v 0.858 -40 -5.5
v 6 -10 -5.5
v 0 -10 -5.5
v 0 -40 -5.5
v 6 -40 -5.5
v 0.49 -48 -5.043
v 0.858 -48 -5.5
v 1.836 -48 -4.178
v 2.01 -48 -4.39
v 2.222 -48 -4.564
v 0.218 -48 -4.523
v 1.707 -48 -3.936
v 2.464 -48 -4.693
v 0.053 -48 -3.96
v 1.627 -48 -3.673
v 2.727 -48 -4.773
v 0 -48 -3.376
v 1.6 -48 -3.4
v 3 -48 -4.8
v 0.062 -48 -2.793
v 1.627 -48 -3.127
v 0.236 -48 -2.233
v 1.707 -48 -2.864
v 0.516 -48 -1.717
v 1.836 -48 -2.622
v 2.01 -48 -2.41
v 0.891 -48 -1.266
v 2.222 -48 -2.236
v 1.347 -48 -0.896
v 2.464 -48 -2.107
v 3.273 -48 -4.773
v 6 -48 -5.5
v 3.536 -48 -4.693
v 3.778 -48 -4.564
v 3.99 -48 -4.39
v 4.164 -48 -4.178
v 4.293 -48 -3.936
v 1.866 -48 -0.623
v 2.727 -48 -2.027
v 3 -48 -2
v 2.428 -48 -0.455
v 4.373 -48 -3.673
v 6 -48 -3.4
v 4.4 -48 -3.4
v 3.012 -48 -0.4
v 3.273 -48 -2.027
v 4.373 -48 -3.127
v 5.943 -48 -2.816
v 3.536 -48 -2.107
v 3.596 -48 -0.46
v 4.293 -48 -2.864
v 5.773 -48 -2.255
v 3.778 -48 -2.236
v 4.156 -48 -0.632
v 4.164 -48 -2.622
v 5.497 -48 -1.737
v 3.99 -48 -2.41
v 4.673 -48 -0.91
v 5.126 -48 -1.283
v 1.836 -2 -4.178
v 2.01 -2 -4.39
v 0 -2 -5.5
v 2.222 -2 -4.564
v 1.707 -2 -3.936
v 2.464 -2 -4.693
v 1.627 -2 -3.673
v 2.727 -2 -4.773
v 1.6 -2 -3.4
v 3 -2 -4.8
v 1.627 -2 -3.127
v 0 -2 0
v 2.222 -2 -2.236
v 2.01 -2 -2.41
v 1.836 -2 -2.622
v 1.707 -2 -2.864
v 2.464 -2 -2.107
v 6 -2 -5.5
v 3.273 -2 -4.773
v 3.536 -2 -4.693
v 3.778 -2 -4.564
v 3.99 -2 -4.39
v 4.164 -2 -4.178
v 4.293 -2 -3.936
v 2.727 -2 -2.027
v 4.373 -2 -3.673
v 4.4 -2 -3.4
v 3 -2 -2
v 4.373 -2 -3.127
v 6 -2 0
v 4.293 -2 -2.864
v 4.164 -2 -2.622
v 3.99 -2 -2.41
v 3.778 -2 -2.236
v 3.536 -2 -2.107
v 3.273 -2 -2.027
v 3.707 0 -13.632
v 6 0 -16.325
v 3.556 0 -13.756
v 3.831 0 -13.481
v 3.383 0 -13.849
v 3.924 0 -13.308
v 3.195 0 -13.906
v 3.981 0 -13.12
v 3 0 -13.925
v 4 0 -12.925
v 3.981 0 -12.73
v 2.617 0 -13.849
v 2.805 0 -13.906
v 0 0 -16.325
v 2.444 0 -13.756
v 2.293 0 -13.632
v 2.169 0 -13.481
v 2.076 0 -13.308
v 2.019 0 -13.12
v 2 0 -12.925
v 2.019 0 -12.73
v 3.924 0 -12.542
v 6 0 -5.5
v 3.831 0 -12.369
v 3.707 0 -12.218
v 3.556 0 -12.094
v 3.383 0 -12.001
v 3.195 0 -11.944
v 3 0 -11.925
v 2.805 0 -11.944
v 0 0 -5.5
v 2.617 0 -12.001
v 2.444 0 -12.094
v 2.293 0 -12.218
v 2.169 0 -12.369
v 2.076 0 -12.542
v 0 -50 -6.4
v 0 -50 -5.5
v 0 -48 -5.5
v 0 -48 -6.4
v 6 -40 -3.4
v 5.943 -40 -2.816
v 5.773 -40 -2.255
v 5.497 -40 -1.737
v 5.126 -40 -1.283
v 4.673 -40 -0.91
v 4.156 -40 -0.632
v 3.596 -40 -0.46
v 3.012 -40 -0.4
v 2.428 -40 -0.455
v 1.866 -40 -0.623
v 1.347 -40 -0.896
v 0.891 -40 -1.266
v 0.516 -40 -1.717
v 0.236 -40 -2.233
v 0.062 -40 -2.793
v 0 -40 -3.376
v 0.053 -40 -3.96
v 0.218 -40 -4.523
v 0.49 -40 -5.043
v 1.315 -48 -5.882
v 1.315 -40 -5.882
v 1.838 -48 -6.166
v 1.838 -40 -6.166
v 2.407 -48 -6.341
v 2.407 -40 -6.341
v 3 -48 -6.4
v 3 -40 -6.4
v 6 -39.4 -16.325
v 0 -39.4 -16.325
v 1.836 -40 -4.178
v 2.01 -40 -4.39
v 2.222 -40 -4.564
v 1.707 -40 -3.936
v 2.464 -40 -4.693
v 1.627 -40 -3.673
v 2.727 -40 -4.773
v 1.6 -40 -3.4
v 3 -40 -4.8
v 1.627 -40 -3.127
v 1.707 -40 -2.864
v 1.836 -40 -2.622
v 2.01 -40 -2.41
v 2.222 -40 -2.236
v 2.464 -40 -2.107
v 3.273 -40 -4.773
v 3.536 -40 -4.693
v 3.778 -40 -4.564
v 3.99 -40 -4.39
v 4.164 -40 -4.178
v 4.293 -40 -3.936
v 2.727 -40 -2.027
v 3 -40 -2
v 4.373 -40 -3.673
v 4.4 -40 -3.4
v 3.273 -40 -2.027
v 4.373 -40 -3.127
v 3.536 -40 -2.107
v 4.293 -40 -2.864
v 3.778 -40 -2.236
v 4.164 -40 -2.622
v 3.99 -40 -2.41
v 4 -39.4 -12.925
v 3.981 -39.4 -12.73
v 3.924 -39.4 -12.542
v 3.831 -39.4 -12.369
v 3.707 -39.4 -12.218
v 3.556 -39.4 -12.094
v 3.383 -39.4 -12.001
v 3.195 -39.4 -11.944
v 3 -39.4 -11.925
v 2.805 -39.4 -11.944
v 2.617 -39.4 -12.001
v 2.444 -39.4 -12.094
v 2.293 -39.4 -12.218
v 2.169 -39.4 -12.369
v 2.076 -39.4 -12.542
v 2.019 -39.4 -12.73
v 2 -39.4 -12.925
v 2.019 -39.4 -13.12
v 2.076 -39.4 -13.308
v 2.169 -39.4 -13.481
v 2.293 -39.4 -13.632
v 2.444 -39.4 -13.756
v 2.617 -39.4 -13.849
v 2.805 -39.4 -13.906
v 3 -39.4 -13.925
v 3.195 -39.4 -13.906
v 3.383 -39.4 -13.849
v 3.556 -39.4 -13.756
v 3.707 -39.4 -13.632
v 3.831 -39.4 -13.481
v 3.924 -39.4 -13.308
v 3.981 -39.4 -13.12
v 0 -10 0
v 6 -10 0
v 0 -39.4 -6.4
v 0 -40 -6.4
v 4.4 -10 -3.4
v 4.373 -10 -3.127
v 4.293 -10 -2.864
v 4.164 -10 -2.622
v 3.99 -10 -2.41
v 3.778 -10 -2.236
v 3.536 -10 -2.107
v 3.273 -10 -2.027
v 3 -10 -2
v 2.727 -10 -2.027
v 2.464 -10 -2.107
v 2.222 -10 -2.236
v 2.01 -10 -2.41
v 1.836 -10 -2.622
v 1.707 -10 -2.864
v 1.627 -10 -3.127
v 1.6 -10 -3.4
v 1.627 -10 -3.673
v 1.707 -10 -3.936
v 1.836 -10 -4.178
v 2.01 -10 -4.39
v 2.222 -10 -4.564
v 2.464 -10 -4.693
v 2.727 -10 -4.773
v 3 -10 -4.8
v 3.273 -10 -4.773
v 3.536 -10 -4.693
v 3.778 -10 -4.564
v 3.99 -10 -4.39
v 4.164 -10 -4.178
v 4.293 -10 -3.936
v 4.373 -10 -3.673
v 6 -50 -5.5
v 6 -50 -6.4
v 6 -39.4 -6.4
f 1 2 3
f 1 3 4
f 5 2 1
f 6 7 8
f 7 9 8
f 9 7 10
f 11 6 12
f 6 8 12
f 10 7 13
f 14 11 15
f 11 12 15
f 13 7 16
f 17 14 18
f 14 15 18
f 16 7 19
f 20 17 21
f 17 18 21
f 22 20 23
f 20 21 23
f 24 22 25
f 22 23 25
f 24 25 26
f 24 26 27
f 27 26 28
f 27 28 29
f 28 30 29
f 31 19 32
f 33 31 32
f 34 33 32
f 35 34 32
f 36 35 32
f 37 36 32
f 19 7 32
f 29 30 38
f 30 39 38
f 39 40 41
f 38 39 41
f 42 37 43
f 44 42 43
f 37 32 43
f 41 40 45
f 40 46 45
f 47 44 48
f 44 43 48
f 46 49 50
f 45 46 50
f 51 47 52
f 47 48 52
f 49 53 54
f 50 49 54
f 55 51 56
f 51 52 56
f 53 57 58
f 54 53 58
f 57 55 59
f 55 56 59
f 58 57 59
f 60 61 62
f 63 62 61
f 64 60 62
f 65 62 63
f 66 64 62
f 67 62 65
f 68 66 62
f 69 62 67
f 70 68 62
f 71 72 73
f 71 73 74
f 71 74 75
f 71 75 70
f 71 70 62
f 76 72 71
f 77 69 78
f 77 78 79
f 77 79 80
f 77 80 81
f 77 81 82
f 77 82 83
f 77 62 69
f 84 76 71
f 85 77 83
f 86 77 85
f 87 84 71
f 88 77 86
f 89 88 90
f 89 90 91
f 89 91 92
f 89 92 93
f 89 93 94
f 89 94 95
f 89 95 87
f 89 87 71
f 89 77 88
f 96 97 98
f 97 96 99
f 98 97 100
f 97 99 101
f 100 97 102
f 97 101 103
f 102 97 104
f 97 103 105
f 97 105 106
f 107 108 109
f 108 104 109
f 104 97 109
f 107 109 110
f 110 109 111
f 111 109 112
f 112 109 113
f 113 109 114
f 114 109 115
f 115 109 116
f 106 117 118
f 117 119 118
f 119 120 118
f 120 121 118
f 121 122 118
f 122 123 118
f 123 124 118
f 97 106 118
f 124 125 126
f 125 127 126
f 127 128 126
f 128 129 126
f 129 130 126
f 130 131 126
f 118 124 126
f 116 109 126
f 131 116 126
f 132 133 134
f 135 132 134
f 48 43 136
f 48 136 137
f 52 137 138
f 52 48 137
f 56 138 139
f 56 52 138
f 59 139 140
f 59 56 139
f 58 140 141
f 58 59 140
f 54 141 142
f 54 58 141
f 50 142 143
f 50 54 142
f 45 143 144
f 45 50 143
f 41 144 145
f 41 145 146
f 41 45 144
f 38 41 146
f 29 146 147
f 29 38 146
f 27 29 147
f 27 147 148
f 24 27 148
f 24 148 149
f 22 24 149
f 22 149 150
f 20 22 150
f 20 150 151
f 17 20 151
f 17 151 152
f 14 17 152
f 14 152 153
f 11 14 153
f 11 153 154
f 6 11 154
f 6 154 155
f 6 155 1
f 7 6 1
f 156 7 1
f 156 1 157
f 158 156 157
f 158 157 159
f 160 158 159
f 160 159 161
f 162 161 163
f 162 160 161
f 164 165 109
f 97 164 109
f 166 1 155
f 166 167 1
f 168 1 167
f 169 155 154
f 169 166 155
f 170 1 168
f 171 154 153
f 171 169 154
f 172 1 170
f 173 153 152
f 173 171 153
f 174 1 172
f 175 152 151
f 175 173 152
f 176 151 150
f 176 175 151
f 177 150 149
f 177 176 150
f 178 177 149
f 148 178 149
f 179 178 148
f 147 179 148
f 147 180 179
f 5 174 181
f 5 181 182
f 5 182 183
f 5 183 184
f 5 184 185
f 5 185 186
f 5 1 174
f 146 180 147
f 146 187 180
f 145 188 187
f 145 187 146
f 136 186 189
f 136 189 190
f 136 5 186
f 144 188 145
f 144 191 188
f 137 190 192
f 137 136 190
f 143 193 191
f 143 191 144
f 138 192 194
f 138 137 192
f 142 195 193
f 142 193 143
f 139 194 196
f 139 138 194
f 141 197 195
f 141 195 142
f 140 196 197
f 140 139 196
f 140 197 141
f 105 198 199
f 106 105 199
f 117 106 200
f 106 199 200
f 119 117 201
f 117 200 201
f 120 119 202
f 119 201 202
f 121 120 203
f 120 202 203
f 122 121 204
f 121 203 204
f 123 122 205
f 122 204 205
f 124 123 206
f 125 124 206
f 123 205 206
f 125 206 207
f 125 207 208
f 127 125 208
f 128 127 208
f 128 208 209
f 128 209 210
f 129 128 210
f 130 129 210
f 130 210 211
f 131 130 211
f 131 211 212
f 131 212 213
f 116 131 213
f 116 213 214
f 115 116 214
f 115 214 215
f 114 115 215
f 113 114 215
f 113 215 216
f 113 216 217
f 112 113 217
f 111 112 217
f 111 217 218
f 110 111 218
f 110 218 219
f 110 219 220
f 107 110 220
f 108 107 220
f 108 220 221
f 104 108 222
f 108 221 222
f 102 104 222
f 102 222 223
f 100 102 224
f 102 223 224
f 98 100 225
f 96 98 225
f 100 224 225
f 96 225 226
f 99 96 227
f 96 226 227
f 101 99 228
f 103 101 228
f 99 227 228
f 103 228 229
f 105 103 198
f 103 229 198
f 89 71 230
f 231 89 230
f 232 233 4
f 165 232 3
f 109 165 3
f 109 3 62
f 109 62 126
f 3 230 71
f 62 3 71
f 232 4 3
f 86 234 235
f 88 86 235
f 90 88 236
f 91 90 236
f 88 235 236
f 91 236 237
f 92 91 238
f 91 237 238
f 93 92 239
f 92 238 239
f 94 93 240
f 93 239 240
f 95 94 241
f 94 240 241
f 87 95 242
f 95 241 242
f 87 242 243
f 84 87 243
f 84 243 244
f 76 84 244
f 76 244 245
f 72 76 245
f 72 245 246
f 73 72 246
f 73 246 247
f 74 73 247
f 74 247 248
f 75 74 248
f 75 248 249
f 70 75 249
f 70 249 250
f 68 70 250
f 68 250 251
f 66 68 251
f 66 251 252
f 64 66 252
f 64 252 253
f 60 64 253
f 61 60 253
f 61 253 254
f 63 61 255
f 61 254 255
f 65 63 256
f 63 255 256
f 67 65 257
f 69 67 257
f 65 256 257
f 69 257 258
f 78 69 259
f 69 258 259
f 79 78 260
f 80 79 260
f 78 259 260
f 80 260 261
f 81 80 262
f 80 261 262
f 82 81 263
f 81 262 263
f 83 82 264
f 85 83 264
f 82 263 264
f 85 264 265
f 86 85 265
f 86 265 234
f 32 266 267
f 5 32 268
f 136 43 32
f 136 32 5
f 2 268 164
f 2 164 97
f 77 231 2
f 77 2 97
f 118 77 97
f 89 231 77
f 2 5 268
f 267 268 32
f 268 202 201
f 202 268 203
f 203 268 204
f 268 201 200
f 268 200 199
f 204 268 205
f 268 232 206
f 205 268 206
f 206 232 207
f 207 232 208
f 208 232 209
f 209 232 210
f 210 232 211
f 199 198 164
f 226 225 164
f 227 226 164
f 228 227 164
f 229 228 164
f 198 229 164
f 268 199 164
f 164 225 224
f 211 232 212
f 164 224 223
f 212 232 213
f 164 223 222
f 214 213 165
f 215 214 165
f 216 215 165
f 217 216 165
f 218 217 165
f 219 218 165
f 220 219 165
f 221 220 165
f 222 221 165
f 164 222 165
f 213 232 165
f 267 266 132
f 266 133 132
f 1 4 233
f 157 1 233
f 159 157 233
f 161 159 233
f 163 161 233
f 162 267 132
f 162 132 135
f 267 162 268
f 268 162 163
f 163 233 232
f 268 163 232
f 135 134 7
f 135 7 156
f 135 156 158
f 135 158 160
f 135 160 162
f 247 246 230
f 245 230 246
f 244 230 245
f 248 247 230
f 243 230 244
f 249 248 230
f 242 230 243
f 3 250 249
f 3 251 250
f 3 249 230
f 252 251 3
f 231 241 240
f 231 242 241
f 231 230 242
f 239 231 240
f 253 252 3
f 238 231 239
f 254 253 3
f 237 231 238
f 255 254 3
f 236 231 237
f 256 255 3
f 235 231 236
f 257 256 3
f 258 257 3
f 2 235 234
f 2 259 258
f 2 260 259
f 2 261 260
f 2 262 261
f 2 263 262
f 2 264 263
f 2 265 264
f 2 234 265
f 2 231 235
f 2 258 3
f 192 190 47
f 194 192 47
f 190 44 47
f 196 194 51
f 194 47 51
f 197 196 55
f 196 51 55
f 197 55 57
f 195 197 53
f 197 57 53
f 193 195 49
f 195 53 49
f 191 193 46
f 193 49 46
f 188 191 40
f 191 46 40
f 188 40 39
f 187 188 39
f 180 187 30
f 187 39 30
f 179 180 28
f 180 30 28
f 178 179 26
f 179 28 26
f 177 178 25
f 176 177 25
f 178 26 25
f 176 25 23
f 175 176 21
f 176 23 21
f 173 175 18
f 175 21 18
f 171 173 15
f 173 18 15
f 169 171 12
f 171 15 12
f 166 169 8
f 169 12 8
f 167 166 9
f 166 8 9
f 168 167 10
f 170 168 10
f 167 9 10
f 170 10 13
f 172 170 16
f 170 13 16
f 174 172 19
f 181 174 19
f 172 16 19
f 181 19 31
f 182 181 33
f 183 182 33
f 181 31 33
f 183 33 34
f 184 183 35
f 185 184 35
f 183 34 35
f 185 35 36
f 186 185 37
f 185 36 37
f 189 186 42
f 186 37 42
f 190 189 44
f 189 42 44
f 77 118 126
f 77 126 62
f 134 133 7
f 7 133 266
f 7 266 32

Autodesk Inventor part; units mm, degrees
ref_plane "YZ Plane" through (0, 0, 0) normal (1, 0, 0) x (0, 1, 0)
ref_plane "XZ Plane" through (0, 0, 0) normal (0, 1, 0) x (-1, 0, 0)
ref_plane "XY Plane" through (0, 0, 0) normal (0, 0, 1) x (1, 0, 0)
sketch "Sketch8" plane through (0, 0, 0) normal (1, 0, 0) x (0, 1, 0)
  line L0 (0, 0) -> (-50, 0)
  line L1 (-50, 0) -> (-50, -16.325)
  line L2 (-50, -16.325) -> (0, -16.325)
  line L3 (0, -16.325) -> (0, 0)
  dimension "d20" = 50
  dimension "d21" = 16.325
extrude "Extrusion5" add sketch "Sketch8" along normal blind 6
sketch "Sketch9" plane through (0, -50, -16.325) normal (0, -1, 0) x (1, 0, 0)
  circle A0 centre (3, 12.925) radius 1.4
  circle A1 centre (3, 3.4) radius 1
  line L0 (0, 16.325) -> (6, 16.325) projected
  line L1 (0, 16.325) -> (0, 0) projected
  line L2 (6, 16.325) -> (6, 0) projected
  line L3 (0, 0) -> (6, 0) projected
  line L4 (3, 16.325) -> (3, 0)
  line L5 (0, 8.1625) -> (6, 8.1625)
  dimension "d24" = 2.8
  dimension "d25" = 2
  dimension "d30" = 9.525
  dimension "d31" = 9.525
  dimension "d32" = 0
  dimension "d33" = 0
extrude "Extrusion6" cut sketch "Sketch9" against normal through all contours A0 L4 | L4 A0 | L4 A1 | A1 L4
sketch "Sketch10" plane through (6, 0, 0) normal (1, 0, 0) x (0, 0, -1)
  line L0 (0, 0) -> (0, -50) projected
  line L1 (0, -50) -> (5.5, -50)
  line L2 (5.5, -50) -> (5.5, -48)
  line L3 (5.5, -48) -> (0, -48)
  line L4 (0, -48) -> (0, -50)
  line L5 (16.325, 0) -> (0, 0) projected
  line L6 (0, 0) -> (5.5, 0)
  line L7 (5.5, 0) -> (5.5, -2)
  line L8 (5.5, -2) -> (0, -2)
  line L9 (0, -2) -> (0, 0)
  dimension "d36" = 5.5
  dimension "d37" = 2
  dimension "d38" = 2
extrude "Extrusion7" cut sketch "Sketch10" against normal through all
sketch "Sketch11" plane through (6, 0, 0) normal (1, 0, 0) x (0, 0, -1)
  line L0 (0, -2) -> (0, -48) projected
  line L1 (0, -25) -> (16.325, -25)
  line L2 (16.325, -50) -> (16.325, 0) projected
  line L3 (5.5, -40) -> (0, -40)
  line L4 (0, -40) -> (0, -10)
  line L5 (0, -10) -> (5.5, -10)
  line L6 (5.5, -10) -> (5.5, -40)
  line L7 (5.5, -40) -> (0, -10) construction
  line L8 (0, -40) -> (5.5, -10) construction
  point P0 (0, 0)
  point P1 (2.75, -25)
  dimension "d41" = 2.75
  dimension "d42" = 30
extrude "Extrusion8" cut sketch "Sketch11" against normal through all
sketch "Sketch12" plane through (6, -48, -5.5) normal (0, -1, 0) x (1, 0, 0)
  circle A0 centre (-3, 2.1) radius 1.4 projected
  circle A1 centre (-3, 2.1) radius 3
  line L0 (-6, 5.5) -> (-6, 0) projected
  line L1 (0, -10.825) -> (0, 0) projected
  line L2 (-3, -0.9) -> (-6, -0.9)
  line L3 (-6, -10.825) -> (-6, 0) projected
  line L4 (0, 0) -> (0, 5.5) projected
  line L5 (0, 2.1) -> (0, 5.5)
  line L6 (0, 5.5) -> (-6, 5.5)
  line L7 (-6, -0.9) -> (-6, 5.5)
  point P0 (0, -0.9)
extrude "Extrusion9" cut sketch "Sketch12" against normal blind 8 contours L2 L3 L0 A1 | A1 L0 L6 L4
sketch "Sketch13" plane through (0, 0, 0) normal (-1, 0, 0) x (0, 0, 1)
  line L0 (-6.4, -48) -> (-6.4, -40) projected
  line L1 (-16.325, -50) -> (-6.4, -50)
  line L2 (-6.4, -50) -> (-6.4, -39.4)
  line L3 (-6.4, -39.4) -> (-16.325, -39.4)
  line L4 (-16.325, -39.4) -> (-16.325, -50)
  point P0 (0, 0)
  dimension "d47" = 10.6
extrude "Extrusion10" cut sketch "Sketch13" against normal through all
properties part number "tracks2"
